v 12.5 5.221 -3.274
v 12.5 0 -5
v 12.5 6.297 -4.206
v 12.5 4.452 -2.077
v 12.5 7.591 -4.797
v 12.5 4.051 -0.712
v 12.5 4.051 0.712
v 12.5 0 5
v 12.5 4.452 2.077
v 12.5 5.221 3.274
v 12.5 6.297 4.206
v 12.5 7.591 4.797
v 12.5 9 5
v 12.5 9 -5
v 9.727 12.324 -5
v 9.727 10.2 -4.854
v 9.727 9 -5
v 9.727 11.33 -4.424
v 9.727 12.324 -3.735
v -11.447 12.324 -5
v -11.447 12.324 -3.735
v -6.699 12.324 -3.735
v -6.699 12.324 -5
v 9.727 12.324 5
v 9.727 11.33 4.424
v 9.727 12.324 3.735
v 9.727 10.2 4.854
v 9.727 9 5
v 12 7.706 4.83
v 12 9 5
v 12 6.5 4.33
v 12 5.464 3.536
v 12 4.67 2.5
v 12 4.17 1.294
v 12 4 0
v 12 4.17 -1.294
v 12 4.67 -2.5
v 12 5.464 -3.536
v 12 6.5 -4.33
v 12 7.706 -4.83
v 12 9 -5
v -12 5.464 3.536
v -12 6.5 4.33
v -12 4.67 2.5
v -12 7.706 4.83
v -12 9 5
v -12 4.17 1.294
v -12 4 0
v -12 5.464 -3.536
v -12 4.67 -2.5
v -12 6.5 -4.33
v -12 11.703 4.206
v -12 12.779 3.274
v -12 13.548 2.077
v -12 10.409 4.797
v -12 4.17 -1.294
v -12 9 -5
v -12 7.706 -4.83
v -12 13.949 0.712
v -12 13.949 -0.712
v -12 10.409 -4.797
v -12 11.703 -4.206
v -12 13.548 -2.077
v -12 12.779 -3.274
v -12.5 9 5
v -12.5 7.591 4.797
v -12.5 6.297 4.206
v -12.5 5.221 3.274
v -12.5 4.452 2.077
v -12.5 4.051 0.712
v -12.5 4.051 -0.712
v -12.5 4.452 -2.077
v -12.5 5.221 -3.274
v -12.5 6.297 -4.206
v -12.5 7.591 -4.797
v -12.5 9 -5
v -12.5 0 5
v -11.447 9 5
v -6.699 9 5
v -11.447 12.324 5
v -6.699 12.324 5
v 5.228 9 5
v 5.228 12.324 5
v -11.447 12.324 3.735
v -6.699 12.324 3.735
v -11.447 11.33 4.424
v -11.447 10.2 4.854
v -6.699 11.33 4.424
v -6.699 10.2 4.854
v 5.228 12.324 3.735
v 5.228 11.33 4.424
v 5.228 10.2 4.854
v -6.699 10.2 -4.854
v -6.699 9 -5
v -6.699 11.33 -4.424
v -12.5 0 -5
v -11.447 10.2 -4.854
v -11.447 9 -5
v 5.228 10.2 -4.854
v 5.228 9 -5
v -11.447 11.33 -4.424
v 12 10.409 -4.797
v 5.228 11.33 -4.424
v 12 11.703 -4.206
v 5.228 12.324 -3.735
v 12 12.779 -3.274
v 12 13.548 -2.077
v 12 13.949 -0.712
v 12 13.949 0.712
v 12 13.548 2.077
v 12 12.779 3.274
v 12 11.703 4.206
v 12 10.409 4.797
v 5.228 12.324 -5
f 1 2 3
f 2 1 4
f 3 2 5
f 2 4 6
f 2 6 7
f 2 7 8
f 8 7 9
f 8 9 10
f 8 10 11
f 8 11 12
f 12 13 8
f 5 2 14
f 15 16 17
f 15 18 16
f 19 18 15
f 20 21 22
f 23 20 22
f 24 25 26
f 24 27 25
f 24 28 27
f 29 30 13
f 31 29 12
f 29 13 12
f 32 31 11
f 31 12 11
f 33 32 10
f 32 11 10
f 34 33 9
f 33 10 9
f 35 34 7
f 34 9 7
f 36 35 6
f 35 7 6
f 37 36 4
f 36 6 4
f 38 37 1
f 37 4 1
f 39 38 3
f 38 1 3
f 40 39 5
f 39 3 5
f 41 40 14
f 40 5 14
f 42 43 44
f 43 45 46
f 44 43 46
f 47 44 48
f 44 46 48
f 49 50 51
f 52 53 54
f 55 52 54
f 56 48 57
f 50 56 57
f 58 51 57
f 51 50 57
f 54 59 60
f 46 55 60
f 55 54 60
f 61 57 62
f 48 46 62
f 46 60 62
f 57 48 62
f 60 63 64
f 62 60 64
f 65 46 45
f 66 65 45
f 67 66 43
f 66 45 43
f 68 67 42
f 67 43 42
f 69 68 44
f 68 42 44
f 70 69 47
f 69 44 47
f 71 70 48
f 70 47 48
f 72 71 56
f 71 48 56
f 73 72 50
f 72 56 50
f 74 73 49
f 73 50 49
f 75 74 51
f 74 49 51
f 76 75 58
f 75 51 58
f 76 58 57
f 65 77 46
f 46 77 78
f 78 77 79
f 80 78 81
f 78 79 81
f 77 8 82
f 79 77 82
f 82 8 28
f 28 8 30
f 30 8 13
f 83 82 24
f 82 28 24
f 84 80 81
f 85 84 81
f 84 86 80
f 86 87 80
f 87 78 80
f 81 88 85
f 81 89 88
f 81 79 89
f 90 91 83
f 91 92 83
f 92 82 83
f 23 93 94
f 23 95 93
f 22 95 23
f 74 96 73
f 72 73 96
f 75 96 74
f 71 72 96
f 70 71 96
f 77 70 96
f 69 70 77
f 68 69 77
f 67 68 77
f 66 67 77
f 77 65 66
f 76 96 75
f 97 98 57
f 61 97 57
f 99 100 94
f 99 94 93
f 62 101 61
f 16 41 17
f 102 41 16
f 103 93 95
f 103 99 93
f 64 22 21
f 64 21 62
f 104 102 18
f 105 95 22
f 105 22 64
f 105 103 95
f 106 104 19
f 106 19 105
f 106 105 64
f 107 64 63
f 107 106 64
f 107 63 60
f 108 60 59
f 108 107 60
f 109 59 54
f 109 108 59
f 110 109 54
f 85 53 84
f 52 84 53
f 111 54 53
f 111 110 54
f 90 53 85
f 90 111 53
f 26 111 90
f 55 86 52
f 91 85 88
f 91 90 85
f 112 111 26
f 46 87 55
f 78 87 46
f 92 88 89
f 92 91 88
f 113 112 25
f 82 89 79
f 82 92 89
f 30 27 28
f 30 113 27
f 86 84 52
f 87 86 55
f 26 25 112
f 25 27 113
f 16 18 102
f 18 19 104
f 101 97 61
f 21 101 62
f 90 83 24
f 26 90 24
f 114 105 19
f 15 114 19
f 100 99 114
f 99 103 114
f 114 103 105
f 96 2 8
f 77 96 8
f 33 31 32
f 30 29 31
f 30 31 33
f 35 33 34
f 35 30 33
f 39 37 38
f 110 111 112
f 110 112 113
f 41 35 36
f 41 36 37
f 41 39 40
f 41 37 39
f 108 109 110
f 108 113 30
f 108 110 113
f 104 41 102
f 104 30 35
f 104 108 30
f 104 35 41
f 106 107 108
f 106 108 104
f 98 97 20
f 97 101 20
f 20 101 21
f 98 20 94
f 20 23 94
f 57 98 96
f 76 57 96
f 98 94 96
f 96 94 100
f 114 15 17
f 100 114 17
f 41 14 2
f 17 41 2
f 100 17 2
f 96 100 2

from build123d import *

# Parameters (mm, degrees)
BOSS_EXTRUDE1_DEPTH = 12.5
BOSS_EXTRUDE2_DEPTH = 12
SKETCH2_W           = 4.747951262
SKETCH2_H           = 6.647569448
SKETCH2_W_2         = 4.499129778
BOSS_EXTRUDE3_DEPTH = 10


with BuildPart() as part:
    # Sketch1 → Boss-Extrude1 (new, symmetric)
    with BuildSketch(Plane(origin=(0, 0, 0), x_dir=(0, 0, -1), z_dir=(1, 0, 0))):
        with BuildLine():
            Line((5, 0), (-5, 0))
            Line((-5, 0), (-5, 3))
            Line((-5, 3), (-5, 9))
            ThreePointArc((-5, 9), (0, 4), (5, 9))
            Line((5, 9), (5, 3))
            Line((5, 3), (5, 0))
        make_face()
    extrude(amount=BOSS_EXTRUDE1_DEPTH, both=True)

    # Sketch1<5> → Boss-Extrude2 (add, symmetric)
    with BuildSketch(Plane(origin=(0, 0, 0), x_dir=(0, 0, -1), z_dir=(1, 0, 0))):
        with BuildLine():
            ThreePointArc((-5, 9), (-3.535533906, 5.464466094), (0, 4))
            ThreePointArc((0, 4), (3.535533906, 5.464466094), (5, 9))
            ThreePointArc((5, 9), (0, 14), (-5, 9))
        make_face()
    extrude(amount=BOSS_EXTRUDE2_DEPTH, both=True)

    # Sketch2 → Boss-Extrude3 (add)
    with BuildSketch(Plane.XY.offset(5)):
        with Locations((-9.073174039, 9)):
            Rectangle(SKETCH2_W, SKETCH2_H)
        with Locations((7.477413935, 9)):
            Rectangle(SKETCH2_W_2, SKETCH2_H)
    extrude(amount=-BOSS_EXTRUDE3_DEPTH)


solid = part.part
